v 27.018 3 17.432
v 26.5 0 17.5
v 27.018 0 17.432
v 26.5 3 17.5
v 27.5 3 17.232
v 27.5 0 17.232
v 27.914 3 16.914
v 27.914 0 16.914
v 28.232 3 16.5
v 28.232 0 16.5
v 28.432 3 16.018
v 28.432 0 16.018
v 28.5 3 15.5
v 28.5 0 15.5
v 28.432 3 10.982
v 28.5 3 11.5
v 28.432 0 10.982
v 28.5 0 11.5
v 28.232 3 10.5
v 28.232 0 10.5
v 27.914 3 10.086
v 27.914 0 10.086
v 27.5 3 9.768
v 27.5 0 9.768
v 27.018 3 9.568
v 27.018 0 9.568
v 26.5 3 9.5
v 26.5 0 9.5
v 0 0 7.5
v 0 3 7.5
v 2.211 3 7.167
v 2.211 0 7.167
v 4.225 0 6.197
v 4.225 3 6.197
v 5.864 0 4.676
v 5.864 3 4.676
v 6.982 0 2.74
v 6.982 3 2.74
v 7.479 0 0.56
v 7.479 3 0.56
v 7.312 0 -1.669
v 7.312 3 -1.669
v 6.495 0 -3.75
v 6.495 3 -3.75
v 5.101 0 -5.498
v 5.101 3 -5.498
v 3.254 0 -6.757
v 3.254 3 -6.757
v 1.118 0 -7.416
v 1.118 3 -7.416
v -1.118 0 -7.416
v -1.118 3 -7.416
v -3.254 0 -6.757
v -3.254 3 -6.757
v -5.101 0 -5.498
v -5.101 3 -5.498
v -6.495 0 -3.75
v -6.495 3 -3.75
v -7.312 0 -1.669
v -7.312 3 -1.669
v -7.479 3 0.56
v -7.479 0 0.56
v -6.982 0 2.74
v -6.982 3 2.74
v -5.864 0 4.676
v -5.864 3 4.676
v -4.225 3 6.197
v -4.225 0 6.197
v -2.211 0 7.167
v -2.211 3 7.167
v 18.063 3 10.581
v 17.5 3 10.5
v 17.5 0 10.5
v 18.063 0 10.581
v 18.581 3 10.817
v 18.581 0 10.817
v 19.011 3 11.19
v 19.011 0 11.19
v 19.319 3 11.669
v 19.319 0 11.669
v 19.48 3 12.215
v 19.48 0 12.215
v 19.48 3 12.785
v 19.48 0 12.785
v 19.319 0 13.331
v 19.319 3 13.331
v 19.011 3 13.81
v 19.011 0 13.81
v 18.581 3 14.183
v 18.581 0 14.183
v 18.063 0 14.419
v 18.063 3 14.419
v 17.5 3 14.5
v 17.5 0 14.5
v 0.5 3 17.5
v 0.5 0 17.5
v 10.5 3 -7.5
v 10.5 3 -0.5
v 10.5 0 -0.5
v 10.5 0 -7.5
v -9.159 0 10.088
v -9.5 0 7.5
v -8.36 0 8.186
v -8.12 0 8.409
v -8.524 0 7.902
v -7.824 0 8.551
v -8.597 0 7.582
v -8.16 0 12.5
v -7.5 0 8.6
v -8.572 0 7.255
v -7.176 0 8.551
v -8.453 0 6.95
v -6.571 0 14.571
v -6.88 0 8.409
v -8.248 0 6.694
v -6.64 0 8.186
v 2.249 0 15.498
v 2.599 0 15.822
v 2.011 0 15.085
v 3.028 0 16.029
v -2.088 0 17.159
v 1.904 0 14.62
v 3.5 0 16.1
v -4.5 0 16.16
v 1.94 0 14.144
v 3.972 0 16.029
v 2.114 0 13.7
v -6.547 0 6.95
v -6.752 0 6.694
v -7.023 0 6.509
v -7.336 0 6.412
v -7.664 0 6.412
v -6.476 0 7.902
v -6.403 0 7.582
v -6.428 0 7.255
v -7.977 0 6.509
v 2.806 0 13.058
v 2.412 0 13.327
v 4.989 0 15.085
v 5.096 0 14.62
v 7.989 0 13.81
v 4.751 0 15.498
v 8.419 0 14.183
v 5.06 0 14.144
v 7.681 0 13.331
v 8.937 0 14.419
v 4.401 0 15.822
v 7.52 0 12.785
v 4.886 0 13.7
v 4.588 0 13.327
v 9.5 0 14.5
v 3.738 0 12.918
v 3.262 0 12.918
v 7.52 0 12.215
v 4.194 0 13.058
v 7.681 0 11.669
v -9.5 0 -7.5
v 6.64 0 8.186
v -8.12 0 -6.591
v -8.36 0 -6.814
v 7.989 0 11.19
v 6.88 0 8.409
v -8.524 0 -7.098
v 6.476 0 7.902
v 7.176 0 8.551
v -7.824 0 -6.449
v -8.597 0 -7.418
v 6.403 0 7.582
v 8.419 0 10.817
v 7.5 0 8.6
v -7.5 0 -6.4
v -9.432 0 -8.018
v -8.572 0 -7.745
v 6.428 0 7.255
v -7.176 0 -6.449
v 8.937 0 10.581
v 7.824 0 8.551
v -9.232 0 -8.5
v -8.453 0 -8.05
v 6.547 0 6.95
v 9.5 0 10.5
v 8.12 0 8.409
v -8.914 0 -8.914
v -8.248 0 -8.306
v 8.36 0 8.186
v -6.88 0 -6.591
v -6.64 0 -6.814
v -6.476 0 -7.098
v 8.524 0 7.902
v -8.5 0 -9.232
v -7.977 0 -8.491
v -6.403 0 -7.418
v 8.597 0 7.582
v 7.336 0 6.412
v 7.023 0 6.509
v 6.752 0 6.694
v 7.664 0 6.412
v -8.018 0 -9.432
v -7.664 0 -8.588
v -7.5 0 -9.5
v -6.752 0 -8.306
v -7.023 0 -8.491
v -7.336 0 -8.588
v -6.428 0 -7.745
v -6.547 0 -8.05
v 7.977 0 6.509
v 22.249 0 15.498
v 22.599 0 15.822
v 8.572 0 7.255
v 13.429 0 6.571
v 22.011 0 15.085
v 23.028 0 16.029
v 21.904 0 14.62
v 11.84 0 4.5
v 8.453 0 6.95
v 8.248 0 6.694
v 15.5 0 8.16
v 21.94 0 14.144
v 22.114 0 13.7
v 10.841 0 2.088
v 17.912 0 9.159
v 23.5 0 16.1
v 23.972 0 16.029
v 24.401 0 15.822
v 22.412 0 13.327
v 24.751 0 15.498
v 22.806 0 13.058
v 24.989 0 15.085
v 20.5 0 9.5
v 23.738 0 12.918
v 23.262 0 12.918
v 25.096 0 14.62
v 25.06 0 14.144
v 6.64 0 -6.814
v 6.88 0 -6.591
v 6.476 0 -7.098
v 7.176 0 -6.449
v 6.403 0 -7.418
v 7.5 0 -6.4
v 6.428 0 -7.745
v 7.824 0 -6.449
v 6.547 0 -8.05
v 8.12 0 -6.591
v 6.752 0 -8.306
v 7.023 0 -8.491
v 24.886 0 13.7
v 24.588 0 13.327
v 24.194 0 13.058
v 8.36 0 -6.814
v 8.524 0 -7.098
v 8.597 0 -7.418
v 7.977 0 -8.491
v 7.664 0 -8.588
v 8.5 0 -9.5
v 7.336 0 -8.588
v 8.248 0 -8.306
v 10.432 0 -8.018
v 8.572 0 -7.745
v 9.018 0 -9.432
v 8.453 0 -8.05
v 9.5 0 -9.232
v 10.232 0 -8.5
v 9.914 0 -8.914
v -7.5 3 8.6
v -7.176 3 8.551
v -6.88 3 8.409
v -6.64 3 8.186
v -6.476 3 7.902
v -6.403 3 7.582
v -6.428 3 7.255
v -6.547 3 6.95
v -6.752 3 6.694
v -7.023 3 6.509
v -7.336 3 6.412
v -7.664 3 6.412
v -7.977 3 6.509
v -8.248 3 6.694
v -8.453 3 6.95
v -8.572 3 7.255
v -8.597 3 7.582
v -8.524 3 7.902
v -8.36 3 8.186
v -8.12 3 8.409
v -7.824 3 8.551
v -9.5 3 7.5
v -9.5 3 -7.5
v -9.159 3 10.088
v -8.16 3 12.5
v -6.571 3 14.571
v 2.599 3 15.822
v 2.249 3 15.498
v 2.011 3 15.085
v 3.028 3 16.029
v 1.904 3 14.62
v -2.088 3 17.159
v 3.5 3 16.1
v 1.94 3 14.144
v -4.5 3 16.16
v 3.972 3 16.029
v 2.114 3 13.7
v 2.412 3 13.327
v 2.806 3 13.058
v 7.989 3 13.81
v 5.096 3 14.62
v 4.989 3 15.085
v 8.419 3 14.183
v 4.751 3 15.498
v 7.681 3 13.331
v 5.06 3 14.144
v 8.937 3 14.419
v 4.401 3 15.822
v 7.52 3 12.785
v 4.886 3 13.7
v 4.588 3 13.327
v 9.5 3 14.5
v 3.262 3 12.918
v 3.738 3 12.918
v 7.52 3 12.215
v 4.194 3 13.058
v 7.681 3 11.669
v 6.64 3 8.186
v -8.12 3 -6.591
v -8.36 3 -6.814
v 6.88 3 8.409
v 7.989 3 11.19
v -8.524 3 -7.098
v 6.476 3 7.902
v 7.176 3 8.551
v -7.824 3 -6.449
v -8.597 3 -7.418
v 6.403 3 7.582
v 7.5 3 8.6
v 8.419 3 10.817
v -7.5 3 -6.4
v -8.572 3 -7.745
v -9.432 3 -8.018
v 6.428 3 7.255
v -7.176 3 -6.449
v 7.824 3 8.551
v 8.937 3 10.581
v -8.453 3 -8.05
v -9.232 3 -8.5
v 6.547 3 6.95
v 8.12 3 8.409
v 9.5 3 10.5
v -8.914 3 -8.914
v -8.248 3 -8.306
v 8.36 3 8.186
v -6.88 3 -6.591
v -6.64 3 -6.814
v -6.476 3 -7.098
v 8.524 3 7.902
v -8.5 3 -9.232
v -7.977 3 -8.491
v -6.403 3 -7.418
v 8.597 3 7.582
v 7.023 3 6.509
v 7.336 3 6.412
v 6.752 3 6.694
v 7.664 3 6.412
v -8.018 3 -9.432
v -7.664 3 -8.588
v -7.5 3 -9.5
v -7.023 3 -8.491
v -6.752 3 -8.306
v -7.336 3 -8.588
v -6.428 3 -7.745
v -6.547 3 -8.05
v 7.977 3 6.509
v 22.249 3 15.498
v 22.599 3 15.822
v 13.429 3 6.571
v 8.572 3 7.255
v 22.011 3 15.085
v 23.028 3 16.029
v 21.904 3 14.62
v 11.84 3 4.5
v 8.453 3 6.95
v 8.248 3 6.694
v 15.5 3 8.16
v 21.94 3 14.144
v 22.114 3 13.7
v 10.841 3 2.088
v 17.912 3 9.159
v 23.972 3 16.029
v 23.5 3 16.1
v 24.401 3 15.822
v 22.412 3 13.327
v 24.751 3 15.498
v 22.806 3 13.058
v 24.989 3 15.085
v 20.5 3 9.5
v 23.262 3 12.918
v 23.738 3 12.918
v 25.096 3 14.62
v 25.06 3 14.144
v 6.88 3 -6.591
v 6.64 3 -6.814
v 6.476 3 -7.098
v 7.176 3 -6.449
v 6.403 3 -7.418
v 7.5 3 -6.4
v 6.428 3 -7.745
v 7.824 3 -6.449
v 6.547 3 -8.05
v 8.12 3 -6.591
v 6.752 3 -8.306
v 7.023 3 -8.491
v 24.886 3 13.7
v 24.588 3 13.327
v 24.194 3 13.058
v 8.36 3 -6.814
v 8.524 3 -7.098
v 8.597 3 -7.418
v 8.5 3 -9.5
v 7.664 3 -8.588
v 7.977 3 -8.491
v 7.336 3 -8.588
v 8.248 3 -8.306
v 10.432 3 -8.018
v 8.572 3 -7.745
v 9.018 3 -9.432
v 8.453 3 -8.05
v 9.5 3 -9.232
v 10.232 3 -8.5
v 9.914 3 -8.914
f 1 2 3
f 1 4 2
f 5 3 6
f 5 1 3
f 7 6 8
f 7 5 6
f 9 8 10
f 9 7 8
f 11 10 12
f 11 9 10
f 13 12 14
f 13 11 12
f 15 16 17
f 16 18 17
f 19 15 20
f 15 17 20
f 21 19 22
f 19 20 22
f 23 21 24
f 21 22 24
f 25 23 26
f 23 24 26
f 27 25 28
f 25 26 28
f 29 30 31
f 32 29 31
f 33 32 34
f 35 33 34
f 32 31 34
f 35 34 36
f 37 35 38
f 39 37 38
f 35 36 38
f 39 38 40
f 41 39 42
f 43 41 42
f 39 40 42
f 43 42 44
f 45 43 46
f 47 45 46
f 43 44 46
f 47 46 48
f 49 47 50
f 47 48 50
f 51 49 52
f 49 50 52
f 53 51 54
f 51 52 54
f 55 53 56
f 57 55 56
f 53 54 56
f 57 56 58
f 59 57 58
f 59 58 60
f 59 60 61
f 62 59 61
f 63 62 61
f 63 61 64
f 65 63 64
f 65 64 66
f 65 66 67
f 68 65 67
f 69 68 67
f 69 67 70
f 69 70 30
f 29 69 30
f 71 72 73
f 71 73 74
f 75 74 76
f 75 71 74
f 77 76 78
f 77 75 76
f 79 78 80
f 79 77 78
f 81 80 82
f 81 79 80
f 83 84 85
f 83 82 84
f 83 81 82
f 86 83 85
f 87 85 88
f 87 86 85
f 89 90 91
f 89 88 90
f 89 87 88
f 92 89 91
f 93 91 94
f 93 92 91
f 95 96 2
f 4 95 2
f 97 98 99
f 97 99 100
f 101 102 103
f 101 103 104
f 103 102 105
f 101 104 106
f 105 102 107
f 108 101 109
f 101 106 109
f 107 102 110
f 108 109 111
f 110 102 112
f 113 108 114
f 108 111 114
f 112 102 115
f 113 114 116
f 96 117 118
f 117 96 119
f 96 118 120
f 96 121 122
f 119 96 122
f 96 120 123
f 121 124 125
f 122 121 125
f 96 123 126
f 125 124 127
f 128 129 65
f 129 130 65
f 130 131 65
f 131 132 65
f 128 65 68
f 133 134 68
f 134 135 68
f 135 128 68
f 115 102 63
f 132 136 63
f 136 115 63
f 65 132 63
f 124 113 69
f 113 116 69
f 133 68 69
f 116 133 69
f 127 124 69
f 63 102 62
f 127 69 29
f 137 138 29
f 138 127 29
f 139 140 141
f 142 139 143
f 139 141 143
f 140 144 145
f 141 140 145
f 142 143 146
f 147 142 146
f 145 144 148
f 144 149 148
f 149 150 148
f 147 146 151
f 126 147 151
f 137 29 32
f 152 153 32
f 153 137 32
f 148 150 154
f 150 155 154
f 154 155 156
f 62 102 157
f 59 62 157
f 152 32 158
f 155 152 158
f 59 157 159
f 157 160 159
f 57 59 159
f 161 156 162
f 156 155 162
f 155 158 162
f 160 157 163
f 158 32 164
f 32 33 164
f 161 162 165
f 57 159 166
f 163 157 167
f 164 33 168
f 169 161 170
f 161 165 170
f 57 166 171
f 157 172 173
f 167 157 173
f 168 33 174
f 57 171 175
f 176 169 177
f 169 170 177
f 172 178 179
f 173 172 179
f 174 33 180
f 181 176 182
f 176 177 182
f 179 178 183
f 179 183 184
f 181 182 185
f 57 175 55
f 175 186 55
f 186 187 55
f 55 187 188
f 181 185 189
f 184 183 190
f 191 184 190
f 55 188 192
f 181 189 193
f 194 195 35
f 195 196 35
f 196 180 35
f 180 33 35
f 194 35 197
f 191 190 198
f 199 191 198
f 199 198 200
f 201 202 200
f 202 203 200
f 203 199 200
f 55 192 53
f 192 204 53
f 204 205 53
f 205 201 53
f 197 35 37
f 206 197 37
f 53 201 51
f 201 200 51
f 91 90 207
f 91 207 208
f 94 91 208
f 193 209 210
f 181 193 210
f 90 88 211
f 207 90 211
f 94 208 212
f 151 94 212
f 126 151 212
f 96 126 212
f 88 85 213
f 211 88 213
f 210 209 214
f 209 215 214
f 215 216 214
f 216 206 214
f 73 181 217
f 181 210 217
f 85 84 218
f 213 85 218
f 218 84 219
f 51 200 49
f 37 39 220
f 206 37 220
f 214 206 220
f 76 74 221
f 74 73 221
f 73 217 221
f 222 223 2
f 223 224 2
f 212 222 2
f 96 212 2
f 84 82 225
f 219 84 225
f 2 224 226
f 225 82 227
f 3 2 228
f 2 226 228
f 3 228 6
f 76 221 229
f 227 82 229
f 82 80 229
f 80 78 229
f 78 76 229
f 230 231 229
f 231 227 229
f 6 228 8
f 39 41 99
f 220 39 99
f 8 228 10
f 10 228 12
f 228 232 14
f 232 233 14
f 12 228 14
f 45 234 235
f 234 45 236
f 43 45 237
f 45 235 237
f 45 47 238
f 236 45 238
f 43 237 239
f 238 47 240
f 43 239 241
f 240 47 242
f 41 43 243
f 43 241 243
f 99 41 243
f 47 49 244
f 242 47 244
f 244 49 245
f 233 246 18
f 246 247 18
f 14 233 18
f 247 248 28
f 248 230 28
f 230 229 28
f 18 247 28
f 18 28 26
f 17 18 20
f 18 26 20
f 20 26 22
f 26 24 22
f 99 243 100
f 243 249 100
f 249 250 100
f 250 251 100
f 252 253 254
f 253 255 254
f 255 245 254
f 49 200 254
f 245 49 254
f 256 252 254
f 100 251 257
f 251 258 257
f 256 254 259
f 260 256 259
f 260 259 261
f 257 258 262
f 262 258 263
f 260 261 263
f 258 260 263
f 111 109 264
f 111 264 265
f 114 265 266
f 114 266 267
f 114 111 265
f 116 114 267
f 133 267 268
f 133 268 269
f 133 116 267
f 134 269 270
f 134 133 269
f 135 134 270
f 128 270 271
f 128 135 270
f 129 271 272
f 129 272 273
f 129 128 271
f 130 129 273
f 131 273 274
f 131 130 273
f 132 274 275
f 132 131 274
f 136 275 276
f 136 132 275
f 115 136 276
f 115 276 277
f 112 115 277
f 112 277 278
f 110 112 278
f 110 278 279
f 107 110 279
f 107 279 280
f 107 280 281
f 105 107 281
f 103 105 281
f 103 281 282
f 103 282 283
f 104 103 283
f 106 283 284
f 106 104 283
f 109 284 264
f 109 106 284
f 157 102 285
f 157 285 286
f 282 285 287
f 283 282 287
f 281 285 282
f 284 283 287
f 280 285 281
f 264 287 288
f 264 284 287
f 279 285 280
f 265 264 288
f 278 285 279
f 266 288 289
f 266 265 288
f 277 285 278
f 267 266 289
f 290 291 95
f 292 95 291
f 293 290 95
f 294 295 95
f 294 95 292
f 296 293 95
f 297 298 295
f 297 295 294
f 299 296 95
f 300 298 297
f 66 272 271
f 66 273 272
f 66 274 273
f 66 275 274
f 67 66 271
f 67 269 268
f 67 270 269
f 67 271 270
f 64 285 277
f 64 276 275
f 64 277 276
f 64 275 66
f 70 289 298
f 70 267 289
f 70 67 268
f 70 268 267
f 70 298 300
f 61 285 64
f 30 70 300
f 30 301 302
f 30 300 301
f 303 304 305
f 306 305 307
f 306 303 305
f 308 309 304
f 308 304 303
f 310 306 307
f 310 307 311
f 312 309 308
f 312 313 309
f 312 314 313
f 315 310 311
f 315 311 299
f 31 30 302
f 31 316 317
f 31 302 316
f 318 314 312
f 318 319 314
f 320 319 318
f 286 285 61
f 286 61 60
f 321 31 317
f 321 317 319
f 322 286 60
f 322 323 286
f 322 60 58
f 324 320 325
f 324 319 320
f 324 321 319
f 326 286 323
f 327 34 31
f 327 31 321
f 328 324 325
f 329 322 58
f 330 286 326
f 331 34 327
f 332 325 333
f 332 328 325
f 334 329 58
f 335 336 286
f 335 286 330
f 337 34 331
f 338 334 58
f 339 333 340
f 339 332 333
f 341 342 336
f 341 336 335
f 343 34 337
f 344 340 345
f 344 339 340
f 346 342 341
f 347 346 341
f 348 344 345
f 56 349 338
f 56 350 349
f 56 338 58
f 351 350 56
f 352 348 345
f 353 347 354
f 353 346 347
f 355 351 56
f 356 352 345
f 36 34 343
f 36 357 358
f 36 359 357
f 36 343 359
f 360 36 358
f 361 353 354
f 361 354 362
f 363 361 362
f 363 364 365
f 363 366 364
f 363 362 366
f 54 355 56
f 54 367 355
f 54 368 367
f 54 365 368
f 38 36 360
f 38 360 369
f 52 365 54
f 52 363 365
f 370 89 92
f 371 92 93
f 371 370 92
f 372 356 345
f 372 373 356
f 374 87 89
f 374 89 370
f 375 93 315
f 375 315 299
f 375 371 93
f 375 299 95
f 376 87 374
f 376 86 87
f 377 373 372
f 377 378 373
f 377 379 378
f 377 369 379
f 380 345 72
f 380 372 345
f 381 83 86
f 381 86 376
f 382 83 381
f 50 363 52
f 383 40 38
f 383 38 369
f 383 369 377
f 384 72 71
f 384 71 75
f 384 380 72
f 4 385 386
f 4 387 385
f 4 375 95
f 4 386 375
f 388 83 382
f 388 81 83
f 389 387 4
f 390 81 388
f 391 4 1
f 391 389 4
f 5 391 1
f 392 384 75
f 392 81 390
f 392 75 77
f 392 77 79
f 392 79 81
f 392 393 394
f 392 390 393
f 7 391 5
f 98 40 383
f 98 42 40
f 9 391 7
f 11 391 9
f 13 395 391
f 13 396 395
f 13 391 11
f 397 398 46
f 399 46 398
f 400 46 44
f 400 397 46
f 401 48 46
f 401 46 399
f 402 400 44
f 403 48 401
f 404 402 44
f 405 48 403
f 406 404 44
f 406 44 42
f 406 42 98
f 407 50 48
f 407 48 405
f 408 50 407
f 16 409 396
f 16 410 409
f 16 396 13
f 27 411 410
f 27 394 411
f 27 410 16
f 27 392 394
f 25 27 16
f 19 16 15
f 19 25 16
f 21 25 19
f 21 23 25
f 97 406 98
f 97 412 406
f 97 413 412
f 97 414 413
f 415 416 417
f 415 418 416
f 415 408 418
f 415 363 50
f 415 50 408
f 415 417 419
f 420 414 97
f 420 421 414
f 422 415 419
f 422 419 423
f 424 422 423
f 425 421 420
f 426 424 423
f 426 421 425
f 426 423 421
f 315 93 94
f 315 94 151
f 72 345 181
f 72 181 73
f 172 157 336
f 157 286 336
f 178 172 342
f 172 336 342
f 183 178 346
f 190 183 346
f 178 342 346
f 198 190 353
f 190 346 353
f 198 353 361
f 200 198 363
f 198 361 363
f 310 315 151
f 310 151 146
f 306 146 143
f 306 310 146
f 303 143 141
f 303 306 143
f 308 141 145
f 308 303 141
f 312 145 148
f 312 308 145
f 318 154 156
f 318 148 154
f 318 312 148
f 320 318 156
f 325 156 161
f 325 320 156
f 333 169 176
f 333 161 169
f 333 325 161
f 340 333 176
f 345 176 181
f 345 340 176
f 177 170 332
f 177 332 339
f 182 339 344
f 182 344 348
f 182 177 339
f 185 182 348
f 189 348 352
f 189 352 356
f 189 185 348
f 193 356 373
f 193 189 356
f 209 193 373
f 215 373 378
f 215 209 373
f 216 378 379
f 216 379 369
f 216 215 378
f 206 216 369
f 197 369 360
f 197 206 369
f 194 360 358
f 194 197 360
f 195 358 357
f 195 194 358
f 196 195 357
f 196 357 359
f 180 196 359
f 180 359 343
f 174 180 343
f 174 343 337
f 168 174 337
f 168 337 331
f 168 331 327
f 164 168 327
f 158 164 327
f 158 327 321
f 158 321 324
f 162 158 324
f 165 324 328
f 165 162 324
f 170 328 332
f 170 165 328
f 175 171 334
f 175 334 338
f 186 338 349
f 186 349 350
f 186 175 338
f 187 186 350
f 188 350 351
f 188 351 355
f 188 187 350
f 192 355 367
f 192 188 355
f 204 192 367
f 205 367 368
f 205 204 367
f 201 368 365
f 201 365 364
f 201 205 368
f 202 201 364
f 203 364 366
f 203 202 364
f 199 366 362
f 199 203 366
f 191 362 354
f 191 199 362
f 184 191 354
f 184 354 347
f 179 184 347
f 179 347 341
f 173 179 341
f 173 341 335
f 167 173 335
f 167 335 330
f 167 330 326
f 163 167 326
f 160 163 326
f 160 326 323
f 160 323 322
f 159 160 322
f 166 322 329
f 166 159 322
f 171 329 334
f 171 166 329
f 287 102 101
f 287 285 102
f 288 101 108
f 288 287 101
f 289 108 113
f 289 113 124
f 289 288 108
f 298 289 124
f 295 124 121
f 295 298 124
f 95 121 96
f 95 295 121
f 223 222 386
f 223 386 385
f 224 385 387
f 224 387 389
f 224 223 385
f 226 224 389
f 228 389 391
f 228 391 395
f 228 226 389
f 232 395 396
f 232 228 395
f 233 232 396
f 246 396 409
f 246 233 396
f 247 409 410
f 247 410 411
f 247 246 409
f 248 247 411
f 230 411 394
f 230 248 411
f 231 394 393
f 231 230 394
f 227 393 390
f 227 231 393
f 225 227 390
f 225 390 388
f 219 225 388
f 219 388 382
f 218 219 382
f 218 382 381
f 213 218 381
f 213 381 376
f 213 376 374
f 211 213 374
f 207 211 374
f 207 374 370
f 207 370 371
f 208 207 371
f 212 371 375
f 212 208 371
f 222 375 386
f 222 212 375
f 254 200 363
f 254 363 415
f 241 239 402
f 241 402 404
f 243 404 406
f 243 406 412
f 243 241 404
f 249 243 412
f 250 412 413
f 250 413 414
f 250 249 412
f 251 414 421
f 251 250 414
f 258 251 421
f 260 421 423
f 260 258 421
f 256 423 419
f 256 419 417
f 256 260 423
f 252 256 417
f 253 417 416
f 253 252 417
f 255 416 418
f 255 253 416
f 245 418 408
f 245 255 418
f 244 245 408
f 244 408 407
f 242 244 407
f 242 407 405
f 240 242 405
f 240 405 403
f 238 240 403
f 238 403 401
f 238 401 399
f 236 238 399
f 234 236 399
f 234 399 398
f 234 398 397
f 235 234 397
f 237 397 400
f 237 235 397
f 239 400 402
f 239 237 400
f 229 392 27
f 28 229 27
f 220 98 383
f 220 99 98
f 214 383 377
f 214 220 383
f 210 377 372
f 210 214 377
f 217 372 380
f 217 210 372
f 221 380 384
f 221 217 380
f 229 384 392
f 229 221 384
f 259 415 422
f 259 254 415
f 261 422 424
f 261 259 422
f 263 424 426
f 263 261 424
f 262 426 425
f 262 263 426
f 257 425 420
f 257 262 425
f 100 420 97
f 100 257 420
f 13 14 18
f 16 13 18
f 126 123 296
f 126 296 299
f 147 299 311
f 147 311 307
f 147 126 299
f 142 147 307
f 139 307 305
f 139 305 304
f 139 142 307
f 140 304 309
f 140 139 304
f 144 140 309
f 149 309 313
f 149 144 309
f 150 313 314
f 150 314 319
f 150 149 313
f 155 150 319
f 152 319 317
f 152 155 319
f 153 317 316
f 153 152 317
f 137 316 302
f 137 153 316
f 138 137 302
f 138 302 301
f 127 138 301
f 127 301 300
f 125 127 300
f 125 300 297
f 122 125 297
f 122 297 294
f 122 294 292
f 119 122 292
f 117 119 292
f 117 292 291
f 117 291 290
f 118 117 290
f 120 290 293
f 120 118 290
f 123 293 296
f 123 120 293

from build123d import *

# Parameters (mm, degrees)
SKETCH_1_W          = 38
SKETCH_1_H          = 27
SKETCH_1_R          = 1.1
SKETCH_1_R_2        = 1.6
EXTRUDE_1_DEPTH     = 3
SKETCH_2_R          = 7.5
SKETCH_2_W          = 18
SKETCH_2_H          = 19
CUT_EXTRUDE_1_DEPTH = 21.5
FILLET_1_R          = 10
CUT_EXTRUDE_2_DEPTH = 21.5
FILLET_2_R          = 2


with BuildPart() as part:
    # 草图1 → 凸台-拉伸1 (new body)
    with BuildSketch(Plane(origin=(0, 0, 0), x_dir=(1, 0, 0), z_dir=(0, 1, 0))):
        with Locations((9.5, -4)):
            Rectangle(SKETCH_1_W, SKETCH_1_H)
        with Locations(Location((7.5, -7.5, 0), (0, 0, 270))):
            Circle(SKETCH_1_R, mode=Mode.SUBTRACT)
        with Locations(Location((7.5, 7.5, 0), (0, 0, 270))):
            Circle(SKETCH_1_R, mode=Mode.SUBTRACT)
        with Locations(Location((-7.5, 7.5, 0), (0, 0, 270))):
            Circle(SKETCH_1_R, mode=Mode.SUBTRACT)
        with Locations(Location((-7.5, -7.5, 0), (0, 0, 270))):
            Circle(SKETCH_1_R, mode=Mode.SUBTRACT)
        with Locations(Location((3.5, -14.5, 0), (0, 0, 270))):
            Circle(SKETCH_1_R_2, mode=Mode.SUBTRACT)
        with Locations(Location((23.5, -14.5, 0), (0, 0, 270))):
            Circle(SKETCH_1_R_2, mode=Mode.SUBTRACT)
    extrude(amount=EXTRUDE_1_DEPTH)

    # 草图2 → 切除-拉伸1 (cut)
    with BuildSketch(Plane(origin=(0, 3, 0), x_dir=(1, 0, 0), z_dir=(0, 1, 0))):
        with Locations(Location((0, 0, 0), (0, 0, 270))):
            Circle(SKETCH_2_R)
        with Locations((19.5, 0)):
            Rectangle(SKETCH_2_W, SKETCH_2_H)
    extrude(amount=-CUT_EXTRUDE_1_DEPTH, mode=Mode.SUBTRACT)

    # 圆角1
    fillet_1_edges = [part.edges().sort_by_distance(p)[0] for p in [
        (10.5, 1.5, 9.5),
        (-9.5, 1.5, 17.5),
    ]]
    fillet(fillet_1_edges, radius=FILLET_1_R)

    # 草图3 → 切除-拉伸2 (cut)
    with BuildSketch(Plane(origin=(0, 3, 0), x_dir=(1, 0, 0), z_dir=(0, 1, 0))):
        with BuildLine():
            Line((9.5, -10.5), (17.5, -10.5))
            ThreePointArc((17.5, -10.5), (19.5, -12.5), (17.5, -14.5))
            Line((17.5, -14.5), (9.5, -14.5))
            ThreePointArc((9.5, -14.5), (7.5, -12.5), (9.5, -10.5))
        make_face()
    extrude(amount=-CUT_EXTRUDE_2_DEPTH, mode=Mode.SUBTRACT)

    # 圆角2
    fillet_2_edges = [part.edges().sort_by_distance(p)[0] for p in [
        (10.5, 1.5, -9.5),
        (28.5, 1.5, 9.5),
        (-9.5, 1.5, -9.5),
        (28.5, 1.5, 17.5),
    ]]
    fillet(fillet_2_edges, radius=FILLET_2_R)


solid = part.part
